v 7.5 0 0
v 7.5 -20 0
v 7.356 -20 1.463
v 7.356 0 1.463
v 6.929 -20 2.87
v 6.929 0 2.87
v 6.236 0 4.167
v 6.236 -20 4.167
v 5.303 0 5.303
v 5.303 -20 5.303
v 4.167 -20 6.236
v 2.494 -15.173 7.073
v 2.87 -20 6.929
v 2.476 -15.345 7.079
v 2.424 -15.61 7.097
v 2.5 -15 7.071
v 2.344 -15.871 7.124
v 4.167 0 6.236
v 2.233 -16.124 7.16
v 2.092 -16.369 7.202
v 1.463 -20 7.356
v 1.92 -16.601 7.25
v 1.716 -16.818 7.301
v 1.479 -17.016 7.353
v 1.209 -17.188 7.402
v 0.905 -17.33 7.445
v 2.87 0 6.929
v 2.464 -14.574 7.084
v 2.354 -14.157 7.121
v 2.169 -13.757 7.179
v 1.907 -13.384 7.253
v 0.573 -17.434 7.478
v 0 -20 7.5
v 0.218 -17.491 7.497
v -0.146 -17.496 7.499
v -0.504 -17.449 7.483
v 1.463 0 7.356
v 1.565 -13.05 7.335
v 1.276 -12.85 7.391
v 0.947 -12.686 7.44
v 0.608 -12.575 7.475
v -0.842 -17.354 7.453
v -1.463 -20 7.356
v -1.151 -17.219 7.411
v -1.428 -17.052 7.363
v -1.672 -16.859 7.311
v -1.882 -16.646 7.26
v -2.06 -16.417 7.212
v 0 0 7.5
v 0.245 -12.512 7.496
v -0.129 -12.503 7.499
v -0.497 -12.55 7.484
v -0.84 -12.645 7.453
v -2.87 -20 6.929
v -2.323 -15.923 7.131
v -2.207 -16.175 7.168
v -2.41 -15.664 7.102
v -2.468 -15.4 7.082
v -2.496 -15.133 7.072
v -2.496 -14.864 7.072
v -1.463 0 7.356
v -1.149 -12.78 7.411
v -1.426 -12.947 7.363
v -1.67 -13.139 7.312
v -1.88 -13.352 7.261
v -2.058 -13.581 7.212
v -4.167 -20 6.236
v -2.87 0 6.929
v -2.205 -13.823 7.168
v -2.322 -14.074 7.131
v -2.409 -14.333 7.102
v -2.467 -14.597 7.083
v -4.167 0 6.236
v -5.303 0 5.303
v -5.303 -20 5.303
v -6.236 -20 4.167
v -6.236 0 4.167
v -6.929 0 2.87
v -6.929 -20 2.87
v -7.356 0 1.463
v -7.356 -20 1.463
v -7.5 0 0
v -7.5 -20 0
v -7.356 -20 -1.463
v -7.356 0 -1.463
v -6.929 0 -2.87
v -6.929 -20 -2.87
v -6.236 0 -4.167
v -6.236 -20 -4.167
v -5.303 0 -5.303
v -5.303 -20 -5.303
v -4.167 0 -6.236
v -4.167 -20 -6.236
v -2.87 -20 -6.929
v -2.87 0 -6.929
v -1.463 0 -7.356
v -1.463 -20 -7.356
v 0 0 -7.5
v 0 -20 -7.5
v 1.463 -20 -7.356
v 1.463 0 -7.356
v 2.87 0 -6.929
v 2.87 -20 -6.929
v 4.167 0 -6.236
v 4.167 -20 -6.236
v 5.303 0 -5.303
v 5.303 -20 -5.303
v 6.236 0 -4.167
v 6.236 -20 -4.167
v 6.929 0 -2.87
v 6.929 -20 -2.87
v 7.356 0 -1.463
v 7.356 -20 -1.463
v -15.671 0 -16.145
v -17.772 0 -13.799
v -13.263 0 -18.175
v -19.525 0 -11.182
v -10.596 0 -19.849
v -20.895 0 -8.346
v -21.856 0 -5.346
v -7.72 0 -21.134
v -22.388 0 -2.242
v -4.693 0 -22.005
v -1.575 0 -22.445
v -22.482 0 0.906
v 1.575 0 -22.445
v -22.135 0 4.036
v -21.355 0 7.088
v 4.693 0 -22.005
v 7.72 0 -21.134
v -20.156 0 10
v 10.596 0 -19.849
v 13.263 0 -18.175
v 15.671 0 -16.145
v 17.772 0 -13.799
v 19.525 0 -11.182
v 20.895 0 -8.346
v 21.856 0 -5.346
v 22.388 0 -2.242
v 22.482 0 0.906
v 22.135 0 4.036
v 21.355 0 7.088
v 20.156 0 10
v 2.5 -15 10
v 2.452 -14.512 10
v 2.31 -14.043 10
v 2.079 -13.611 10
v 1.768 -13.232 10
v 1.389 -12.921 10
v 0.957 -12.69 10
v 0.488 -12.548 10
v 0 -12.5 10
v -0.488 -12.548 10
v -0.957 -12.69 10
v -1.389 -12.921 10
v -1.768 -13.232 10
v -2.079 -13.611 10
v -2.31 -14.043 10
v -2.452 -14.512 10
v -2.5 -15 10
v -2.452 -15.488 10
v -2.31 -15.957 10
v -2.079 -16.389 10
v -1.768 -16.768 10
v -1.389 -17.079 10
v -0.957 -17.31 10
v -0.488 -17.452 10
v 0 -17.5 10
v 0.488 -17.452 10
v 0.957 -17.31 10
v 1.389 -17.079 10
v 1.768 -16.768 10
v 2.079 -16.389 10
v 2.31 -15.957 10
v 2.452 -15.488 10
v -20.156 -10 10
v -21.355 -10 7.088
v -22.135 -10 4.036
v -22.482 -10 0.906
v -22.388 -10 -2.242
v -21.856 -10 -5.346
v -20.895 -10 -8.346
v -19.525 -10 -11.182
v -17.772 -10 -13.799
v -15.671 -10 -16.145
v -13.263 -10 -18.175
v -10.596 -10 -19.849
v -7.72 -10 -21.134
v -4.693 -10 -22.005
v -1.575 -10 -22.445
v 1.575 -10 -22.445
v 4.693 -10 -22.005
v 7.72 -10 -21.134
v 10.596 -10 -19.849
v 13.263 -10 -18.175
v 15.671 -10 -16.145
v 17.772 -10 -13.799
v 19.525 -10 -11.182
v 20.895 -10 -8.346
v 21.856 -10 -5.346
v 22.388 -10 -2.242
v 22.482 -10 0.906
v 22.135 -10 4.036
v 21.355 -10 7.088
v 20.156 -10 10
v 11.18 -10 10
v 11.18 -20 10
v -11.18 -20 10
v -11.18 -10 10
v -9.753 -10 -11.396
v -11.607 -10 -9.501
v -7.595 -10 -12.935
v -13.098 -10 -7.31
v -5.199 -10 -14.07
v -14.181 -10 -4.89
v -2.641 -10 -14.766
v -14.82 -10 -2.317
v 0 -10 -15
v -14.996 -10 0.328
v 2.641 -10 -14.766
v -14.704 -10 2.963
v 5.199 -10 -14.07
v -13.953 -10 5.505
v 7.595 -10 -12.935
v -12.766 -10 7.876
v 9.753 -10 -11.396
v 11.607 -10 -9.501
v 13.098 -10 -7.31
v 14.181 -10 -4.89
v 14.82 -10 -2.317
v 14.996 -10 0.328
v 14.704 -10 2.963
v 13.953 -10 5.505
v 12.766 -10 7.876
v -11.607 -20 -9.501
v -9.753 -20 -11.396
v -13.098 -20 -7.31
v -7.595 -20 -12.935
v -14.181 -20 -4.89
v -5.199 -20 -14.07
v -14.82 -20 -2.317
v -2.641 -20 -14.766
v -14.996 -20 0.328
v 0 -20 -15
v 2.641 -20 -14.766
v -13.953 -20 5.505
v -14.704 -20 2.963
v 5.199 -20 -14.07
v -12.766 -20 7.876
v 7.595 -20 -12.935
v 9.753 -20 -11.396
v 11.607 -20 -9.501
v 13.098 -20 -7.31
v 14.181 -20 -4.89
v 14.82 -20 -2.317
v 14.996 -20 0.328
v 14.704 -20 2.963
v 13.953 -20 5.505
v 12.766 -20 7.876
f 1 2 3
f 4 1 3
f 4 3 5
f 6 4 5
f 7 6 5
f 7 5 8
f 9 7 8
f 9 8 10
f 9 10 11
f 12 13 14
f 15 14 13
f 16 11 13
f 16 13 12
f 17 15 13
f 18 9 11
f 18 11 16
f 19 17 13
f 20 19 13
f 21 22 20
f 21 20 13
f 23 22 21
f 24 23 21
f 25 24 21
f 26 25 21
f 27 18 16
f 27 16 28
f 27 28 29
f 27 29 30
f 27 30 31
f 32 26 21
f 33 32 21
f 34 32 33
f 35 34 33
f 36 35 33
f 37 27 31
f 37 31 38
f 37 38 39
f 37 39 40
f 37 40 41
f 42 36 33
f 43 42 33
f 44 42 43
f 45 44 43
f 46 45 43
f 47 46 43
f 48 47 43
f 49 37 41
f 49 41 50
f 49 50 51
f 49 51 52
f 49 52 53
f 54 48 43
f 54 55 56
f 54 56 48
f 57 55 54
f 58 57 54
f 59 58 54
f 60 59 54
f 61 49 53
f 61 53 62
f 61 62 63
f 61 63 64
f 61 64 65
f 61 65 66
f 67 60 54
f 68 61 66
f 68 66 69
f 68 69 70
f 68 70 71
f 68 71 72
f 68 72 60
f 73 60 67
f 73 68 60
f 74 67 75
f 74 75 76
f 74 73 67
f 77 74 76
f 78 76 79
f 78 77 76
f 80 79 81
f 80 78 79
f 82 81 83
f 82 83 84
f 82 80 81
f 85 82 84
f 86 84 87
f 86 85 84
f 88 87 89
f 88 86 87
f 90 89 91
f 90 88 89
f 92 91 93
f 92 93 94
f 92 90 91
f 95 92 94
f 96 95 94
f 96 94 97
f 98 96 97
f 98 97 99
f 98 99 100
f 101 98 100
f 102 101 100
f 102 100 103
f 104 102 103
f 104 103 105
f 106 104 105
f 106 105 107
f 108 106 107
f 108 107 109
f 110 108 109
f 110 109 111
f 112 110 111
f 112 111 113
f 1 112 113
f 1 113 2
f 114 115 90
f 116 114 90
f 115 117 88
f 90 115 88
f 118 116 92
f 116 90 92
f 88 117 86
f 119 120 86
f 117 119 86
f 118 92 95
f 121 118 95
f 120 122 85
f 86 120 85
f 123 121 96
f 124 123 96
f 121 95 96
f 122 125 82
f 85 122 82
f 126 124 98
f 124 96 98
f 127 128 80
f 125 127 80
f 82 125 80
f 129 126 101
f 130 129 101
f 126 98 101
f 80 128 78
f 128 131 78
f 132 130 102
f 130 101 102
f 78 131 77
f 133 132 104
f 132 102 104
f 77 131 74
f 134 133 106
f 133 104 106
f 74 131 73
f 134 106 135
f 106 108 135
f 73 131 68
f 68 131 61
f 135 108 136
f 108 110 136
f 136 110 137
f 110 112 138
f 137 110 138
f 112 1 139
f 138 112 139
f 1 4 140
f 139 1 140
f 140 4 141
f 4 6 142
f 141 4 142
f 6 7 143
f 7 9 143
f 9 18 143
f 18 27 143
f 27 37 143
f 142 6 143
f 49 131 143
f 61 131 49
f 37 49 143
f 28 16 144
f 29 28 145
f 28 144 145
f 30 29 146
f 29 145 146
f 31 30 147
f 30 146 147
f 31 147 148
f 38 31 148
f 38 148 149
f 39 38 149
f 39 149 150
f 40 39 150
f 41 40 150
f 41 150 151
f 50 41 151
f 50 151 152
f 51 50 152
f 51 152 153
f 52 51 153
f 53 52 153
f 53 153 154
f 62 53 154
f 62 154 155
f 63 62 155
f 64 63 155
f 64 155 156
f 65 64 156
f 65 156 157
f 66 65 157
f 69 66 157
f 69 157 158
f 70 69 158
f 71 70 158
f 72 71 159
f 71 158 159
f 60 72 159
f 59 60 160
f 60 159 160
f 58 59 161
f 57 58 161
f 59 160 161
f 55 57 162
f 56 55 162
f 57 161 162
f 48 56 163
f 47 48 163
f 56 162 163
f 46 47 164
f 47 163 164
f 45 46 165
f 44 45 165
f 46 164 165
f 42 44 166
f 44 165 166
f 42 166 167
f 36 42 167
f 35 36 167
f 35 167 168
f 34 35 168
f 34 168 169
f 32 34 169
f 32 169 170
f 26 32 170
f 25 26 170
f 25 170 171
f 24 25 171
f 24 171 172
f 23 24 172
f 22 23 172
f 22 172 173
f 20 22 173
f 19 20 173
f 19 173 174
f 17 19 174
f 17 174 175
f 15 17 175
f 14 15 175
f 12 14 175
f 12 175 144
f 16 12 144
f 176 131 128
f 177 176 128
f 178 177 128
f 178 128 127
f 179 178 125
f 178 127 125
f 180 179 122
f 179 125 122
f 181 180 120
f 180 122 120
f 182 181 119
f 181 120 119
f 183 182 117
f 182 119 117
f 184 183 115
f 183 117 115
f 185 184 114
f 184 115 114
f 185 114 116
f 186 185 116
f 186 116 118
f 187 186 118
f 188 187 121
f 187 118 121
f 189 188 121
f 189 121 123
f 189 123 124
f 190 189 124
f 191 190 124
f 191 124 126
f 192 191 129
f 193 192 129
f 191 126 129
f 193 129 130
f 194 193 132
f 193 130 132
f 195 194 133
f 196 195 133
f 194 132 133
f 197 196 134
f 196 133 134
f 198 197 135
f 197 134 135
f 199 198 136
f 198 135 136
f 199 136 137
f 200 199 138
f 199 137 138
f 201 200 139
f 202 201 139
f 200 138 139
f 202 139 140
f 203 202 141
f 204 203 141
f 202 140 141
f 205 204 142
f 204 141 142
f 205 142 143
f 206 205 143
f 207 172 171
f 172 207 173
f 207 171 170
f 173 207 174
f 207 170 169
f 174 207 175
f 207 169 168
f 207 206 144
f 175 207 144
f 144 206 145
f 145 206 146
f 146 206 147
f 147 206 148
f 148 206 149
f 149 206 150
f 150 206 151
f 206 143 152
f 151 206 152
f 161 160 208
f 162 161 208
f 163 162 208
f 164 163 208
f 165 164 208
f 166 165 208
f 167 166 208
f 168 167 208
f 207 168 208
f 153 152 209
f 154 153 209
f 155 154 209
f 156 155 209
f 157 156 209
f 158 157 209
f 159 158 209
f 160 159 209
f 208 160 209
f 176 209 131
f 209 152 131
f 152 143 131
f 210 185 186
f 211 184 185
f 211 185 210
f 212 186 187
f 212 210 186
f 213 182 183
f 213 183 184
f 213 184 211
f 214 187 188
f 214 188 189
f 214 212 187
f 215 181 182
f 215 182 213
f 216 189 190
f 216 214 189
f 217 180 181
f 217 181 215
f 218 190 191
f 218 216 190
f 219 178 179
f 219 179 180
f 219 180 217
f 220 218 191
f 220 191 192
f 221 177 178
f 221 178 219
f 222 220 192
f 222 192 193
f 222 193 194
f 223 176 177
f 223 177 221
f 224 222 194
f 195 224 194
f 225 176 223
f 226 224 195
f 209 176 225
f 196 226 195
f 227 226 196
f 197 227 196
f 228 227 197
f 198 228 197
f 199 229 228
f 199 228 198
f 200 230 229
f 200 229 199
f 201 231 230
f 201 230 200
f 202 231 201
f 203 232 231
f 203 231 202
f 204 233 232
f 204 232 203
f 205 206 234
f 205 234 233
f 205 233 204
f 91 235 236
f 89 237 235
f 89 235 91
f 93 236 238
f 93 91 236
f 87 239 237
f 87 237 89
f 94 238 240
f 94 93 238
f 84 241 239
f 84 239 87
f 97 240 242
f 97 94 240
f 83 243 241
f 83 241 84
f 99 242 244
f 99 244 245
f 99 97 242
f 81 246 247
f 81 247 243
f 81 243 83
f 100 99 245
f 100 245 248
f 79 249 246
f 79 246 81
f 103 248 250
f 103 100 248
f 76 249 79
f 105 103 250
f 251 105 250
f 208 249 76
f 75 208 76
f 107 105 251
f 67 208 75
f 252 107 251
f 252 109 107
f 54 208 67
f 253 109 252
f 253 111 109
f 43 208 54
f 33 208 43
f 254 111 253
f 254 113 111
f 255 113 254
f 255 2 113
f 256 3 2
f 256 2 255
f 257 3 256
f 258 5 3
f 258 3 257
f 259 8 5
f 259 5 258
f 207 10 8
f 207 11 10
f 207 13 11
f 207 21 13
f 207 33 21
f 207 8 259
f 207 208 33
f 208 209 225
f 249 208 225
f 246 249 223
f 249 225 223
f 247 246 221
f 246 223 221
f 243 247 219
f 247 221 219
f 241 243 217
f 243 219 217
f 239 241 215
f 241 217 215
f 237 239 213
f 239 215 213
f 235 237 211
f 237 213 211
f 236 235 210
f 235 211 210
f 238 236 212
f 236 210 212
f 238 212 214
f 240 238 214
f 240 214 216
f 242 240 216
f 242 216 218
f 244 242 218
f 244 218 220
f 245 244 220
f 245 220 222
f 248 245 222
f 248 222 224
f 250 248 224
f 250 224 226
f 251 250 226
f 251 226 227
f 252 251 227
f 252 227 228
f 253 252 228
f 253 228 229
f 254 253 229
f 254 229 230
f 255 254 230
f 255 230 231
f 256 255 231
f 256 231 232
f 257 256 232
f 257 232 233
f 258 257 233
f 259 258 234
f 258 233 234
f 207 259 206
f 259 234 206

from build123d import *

# Parameters (mm, degrees)
F0_R     = 7.5
F1_DEPTH = 10
F2_DEPTH = 20
F3_R     = 2.5
F4_DEPTH = 3.9289322881


with BuildPart() as f1:
    # F0 (on Front) → F1 (new body)
    with BuildSketch(Plane.XZ):
        with BuildLine():
            Line((11.1803398875, 10), (-11.1803398875, 10))
            ThreePointArc((-11.1803398875, 10), (0, -15), (11.1803398875, 10))
        make_face()
        Circle(F0_R, mode=Mode.SUBTRACT)
        with BuildLine():
            ThreePointArc((11.1803398875, 10), (0, -15), (-11.1803398875, 10))
            Line((-11.1803398875, 10), (-20.1556443707, 10))
            ThreePointArc((-20.1556443707, 10), (0, -22.5), (20.1556443707, 10))
            Line((20.1556443707, 10), (11.1803398875, 10))
        make_face()
    extrude(amount=F1_DEPTH)

    # F0 (on Front) → F2 (join)
    with BuildSketch(Plane.XZ):
        with BuildLine():
            Line((11.1803398875, 10), (-11.1803398875, 10))
            ThreePointArc((-11.1803398875, 10), (0, -15), (11.1803398875, 10))
        make_face()
        Circle(F0_R, mode=Mode.SUBTRACT)
    extrude(amount=F2_DEPTH)

    # F3 (on face) → F4 (cut, up to face)
    with BuildSketch(Plane.XY.offset(10)):
        with Locations((0, -15)):
            Circle(F3_R)
    extrude(amount=-F4_DEPTH, mode=Mode.SUBTRACT)


solid = f1.part
